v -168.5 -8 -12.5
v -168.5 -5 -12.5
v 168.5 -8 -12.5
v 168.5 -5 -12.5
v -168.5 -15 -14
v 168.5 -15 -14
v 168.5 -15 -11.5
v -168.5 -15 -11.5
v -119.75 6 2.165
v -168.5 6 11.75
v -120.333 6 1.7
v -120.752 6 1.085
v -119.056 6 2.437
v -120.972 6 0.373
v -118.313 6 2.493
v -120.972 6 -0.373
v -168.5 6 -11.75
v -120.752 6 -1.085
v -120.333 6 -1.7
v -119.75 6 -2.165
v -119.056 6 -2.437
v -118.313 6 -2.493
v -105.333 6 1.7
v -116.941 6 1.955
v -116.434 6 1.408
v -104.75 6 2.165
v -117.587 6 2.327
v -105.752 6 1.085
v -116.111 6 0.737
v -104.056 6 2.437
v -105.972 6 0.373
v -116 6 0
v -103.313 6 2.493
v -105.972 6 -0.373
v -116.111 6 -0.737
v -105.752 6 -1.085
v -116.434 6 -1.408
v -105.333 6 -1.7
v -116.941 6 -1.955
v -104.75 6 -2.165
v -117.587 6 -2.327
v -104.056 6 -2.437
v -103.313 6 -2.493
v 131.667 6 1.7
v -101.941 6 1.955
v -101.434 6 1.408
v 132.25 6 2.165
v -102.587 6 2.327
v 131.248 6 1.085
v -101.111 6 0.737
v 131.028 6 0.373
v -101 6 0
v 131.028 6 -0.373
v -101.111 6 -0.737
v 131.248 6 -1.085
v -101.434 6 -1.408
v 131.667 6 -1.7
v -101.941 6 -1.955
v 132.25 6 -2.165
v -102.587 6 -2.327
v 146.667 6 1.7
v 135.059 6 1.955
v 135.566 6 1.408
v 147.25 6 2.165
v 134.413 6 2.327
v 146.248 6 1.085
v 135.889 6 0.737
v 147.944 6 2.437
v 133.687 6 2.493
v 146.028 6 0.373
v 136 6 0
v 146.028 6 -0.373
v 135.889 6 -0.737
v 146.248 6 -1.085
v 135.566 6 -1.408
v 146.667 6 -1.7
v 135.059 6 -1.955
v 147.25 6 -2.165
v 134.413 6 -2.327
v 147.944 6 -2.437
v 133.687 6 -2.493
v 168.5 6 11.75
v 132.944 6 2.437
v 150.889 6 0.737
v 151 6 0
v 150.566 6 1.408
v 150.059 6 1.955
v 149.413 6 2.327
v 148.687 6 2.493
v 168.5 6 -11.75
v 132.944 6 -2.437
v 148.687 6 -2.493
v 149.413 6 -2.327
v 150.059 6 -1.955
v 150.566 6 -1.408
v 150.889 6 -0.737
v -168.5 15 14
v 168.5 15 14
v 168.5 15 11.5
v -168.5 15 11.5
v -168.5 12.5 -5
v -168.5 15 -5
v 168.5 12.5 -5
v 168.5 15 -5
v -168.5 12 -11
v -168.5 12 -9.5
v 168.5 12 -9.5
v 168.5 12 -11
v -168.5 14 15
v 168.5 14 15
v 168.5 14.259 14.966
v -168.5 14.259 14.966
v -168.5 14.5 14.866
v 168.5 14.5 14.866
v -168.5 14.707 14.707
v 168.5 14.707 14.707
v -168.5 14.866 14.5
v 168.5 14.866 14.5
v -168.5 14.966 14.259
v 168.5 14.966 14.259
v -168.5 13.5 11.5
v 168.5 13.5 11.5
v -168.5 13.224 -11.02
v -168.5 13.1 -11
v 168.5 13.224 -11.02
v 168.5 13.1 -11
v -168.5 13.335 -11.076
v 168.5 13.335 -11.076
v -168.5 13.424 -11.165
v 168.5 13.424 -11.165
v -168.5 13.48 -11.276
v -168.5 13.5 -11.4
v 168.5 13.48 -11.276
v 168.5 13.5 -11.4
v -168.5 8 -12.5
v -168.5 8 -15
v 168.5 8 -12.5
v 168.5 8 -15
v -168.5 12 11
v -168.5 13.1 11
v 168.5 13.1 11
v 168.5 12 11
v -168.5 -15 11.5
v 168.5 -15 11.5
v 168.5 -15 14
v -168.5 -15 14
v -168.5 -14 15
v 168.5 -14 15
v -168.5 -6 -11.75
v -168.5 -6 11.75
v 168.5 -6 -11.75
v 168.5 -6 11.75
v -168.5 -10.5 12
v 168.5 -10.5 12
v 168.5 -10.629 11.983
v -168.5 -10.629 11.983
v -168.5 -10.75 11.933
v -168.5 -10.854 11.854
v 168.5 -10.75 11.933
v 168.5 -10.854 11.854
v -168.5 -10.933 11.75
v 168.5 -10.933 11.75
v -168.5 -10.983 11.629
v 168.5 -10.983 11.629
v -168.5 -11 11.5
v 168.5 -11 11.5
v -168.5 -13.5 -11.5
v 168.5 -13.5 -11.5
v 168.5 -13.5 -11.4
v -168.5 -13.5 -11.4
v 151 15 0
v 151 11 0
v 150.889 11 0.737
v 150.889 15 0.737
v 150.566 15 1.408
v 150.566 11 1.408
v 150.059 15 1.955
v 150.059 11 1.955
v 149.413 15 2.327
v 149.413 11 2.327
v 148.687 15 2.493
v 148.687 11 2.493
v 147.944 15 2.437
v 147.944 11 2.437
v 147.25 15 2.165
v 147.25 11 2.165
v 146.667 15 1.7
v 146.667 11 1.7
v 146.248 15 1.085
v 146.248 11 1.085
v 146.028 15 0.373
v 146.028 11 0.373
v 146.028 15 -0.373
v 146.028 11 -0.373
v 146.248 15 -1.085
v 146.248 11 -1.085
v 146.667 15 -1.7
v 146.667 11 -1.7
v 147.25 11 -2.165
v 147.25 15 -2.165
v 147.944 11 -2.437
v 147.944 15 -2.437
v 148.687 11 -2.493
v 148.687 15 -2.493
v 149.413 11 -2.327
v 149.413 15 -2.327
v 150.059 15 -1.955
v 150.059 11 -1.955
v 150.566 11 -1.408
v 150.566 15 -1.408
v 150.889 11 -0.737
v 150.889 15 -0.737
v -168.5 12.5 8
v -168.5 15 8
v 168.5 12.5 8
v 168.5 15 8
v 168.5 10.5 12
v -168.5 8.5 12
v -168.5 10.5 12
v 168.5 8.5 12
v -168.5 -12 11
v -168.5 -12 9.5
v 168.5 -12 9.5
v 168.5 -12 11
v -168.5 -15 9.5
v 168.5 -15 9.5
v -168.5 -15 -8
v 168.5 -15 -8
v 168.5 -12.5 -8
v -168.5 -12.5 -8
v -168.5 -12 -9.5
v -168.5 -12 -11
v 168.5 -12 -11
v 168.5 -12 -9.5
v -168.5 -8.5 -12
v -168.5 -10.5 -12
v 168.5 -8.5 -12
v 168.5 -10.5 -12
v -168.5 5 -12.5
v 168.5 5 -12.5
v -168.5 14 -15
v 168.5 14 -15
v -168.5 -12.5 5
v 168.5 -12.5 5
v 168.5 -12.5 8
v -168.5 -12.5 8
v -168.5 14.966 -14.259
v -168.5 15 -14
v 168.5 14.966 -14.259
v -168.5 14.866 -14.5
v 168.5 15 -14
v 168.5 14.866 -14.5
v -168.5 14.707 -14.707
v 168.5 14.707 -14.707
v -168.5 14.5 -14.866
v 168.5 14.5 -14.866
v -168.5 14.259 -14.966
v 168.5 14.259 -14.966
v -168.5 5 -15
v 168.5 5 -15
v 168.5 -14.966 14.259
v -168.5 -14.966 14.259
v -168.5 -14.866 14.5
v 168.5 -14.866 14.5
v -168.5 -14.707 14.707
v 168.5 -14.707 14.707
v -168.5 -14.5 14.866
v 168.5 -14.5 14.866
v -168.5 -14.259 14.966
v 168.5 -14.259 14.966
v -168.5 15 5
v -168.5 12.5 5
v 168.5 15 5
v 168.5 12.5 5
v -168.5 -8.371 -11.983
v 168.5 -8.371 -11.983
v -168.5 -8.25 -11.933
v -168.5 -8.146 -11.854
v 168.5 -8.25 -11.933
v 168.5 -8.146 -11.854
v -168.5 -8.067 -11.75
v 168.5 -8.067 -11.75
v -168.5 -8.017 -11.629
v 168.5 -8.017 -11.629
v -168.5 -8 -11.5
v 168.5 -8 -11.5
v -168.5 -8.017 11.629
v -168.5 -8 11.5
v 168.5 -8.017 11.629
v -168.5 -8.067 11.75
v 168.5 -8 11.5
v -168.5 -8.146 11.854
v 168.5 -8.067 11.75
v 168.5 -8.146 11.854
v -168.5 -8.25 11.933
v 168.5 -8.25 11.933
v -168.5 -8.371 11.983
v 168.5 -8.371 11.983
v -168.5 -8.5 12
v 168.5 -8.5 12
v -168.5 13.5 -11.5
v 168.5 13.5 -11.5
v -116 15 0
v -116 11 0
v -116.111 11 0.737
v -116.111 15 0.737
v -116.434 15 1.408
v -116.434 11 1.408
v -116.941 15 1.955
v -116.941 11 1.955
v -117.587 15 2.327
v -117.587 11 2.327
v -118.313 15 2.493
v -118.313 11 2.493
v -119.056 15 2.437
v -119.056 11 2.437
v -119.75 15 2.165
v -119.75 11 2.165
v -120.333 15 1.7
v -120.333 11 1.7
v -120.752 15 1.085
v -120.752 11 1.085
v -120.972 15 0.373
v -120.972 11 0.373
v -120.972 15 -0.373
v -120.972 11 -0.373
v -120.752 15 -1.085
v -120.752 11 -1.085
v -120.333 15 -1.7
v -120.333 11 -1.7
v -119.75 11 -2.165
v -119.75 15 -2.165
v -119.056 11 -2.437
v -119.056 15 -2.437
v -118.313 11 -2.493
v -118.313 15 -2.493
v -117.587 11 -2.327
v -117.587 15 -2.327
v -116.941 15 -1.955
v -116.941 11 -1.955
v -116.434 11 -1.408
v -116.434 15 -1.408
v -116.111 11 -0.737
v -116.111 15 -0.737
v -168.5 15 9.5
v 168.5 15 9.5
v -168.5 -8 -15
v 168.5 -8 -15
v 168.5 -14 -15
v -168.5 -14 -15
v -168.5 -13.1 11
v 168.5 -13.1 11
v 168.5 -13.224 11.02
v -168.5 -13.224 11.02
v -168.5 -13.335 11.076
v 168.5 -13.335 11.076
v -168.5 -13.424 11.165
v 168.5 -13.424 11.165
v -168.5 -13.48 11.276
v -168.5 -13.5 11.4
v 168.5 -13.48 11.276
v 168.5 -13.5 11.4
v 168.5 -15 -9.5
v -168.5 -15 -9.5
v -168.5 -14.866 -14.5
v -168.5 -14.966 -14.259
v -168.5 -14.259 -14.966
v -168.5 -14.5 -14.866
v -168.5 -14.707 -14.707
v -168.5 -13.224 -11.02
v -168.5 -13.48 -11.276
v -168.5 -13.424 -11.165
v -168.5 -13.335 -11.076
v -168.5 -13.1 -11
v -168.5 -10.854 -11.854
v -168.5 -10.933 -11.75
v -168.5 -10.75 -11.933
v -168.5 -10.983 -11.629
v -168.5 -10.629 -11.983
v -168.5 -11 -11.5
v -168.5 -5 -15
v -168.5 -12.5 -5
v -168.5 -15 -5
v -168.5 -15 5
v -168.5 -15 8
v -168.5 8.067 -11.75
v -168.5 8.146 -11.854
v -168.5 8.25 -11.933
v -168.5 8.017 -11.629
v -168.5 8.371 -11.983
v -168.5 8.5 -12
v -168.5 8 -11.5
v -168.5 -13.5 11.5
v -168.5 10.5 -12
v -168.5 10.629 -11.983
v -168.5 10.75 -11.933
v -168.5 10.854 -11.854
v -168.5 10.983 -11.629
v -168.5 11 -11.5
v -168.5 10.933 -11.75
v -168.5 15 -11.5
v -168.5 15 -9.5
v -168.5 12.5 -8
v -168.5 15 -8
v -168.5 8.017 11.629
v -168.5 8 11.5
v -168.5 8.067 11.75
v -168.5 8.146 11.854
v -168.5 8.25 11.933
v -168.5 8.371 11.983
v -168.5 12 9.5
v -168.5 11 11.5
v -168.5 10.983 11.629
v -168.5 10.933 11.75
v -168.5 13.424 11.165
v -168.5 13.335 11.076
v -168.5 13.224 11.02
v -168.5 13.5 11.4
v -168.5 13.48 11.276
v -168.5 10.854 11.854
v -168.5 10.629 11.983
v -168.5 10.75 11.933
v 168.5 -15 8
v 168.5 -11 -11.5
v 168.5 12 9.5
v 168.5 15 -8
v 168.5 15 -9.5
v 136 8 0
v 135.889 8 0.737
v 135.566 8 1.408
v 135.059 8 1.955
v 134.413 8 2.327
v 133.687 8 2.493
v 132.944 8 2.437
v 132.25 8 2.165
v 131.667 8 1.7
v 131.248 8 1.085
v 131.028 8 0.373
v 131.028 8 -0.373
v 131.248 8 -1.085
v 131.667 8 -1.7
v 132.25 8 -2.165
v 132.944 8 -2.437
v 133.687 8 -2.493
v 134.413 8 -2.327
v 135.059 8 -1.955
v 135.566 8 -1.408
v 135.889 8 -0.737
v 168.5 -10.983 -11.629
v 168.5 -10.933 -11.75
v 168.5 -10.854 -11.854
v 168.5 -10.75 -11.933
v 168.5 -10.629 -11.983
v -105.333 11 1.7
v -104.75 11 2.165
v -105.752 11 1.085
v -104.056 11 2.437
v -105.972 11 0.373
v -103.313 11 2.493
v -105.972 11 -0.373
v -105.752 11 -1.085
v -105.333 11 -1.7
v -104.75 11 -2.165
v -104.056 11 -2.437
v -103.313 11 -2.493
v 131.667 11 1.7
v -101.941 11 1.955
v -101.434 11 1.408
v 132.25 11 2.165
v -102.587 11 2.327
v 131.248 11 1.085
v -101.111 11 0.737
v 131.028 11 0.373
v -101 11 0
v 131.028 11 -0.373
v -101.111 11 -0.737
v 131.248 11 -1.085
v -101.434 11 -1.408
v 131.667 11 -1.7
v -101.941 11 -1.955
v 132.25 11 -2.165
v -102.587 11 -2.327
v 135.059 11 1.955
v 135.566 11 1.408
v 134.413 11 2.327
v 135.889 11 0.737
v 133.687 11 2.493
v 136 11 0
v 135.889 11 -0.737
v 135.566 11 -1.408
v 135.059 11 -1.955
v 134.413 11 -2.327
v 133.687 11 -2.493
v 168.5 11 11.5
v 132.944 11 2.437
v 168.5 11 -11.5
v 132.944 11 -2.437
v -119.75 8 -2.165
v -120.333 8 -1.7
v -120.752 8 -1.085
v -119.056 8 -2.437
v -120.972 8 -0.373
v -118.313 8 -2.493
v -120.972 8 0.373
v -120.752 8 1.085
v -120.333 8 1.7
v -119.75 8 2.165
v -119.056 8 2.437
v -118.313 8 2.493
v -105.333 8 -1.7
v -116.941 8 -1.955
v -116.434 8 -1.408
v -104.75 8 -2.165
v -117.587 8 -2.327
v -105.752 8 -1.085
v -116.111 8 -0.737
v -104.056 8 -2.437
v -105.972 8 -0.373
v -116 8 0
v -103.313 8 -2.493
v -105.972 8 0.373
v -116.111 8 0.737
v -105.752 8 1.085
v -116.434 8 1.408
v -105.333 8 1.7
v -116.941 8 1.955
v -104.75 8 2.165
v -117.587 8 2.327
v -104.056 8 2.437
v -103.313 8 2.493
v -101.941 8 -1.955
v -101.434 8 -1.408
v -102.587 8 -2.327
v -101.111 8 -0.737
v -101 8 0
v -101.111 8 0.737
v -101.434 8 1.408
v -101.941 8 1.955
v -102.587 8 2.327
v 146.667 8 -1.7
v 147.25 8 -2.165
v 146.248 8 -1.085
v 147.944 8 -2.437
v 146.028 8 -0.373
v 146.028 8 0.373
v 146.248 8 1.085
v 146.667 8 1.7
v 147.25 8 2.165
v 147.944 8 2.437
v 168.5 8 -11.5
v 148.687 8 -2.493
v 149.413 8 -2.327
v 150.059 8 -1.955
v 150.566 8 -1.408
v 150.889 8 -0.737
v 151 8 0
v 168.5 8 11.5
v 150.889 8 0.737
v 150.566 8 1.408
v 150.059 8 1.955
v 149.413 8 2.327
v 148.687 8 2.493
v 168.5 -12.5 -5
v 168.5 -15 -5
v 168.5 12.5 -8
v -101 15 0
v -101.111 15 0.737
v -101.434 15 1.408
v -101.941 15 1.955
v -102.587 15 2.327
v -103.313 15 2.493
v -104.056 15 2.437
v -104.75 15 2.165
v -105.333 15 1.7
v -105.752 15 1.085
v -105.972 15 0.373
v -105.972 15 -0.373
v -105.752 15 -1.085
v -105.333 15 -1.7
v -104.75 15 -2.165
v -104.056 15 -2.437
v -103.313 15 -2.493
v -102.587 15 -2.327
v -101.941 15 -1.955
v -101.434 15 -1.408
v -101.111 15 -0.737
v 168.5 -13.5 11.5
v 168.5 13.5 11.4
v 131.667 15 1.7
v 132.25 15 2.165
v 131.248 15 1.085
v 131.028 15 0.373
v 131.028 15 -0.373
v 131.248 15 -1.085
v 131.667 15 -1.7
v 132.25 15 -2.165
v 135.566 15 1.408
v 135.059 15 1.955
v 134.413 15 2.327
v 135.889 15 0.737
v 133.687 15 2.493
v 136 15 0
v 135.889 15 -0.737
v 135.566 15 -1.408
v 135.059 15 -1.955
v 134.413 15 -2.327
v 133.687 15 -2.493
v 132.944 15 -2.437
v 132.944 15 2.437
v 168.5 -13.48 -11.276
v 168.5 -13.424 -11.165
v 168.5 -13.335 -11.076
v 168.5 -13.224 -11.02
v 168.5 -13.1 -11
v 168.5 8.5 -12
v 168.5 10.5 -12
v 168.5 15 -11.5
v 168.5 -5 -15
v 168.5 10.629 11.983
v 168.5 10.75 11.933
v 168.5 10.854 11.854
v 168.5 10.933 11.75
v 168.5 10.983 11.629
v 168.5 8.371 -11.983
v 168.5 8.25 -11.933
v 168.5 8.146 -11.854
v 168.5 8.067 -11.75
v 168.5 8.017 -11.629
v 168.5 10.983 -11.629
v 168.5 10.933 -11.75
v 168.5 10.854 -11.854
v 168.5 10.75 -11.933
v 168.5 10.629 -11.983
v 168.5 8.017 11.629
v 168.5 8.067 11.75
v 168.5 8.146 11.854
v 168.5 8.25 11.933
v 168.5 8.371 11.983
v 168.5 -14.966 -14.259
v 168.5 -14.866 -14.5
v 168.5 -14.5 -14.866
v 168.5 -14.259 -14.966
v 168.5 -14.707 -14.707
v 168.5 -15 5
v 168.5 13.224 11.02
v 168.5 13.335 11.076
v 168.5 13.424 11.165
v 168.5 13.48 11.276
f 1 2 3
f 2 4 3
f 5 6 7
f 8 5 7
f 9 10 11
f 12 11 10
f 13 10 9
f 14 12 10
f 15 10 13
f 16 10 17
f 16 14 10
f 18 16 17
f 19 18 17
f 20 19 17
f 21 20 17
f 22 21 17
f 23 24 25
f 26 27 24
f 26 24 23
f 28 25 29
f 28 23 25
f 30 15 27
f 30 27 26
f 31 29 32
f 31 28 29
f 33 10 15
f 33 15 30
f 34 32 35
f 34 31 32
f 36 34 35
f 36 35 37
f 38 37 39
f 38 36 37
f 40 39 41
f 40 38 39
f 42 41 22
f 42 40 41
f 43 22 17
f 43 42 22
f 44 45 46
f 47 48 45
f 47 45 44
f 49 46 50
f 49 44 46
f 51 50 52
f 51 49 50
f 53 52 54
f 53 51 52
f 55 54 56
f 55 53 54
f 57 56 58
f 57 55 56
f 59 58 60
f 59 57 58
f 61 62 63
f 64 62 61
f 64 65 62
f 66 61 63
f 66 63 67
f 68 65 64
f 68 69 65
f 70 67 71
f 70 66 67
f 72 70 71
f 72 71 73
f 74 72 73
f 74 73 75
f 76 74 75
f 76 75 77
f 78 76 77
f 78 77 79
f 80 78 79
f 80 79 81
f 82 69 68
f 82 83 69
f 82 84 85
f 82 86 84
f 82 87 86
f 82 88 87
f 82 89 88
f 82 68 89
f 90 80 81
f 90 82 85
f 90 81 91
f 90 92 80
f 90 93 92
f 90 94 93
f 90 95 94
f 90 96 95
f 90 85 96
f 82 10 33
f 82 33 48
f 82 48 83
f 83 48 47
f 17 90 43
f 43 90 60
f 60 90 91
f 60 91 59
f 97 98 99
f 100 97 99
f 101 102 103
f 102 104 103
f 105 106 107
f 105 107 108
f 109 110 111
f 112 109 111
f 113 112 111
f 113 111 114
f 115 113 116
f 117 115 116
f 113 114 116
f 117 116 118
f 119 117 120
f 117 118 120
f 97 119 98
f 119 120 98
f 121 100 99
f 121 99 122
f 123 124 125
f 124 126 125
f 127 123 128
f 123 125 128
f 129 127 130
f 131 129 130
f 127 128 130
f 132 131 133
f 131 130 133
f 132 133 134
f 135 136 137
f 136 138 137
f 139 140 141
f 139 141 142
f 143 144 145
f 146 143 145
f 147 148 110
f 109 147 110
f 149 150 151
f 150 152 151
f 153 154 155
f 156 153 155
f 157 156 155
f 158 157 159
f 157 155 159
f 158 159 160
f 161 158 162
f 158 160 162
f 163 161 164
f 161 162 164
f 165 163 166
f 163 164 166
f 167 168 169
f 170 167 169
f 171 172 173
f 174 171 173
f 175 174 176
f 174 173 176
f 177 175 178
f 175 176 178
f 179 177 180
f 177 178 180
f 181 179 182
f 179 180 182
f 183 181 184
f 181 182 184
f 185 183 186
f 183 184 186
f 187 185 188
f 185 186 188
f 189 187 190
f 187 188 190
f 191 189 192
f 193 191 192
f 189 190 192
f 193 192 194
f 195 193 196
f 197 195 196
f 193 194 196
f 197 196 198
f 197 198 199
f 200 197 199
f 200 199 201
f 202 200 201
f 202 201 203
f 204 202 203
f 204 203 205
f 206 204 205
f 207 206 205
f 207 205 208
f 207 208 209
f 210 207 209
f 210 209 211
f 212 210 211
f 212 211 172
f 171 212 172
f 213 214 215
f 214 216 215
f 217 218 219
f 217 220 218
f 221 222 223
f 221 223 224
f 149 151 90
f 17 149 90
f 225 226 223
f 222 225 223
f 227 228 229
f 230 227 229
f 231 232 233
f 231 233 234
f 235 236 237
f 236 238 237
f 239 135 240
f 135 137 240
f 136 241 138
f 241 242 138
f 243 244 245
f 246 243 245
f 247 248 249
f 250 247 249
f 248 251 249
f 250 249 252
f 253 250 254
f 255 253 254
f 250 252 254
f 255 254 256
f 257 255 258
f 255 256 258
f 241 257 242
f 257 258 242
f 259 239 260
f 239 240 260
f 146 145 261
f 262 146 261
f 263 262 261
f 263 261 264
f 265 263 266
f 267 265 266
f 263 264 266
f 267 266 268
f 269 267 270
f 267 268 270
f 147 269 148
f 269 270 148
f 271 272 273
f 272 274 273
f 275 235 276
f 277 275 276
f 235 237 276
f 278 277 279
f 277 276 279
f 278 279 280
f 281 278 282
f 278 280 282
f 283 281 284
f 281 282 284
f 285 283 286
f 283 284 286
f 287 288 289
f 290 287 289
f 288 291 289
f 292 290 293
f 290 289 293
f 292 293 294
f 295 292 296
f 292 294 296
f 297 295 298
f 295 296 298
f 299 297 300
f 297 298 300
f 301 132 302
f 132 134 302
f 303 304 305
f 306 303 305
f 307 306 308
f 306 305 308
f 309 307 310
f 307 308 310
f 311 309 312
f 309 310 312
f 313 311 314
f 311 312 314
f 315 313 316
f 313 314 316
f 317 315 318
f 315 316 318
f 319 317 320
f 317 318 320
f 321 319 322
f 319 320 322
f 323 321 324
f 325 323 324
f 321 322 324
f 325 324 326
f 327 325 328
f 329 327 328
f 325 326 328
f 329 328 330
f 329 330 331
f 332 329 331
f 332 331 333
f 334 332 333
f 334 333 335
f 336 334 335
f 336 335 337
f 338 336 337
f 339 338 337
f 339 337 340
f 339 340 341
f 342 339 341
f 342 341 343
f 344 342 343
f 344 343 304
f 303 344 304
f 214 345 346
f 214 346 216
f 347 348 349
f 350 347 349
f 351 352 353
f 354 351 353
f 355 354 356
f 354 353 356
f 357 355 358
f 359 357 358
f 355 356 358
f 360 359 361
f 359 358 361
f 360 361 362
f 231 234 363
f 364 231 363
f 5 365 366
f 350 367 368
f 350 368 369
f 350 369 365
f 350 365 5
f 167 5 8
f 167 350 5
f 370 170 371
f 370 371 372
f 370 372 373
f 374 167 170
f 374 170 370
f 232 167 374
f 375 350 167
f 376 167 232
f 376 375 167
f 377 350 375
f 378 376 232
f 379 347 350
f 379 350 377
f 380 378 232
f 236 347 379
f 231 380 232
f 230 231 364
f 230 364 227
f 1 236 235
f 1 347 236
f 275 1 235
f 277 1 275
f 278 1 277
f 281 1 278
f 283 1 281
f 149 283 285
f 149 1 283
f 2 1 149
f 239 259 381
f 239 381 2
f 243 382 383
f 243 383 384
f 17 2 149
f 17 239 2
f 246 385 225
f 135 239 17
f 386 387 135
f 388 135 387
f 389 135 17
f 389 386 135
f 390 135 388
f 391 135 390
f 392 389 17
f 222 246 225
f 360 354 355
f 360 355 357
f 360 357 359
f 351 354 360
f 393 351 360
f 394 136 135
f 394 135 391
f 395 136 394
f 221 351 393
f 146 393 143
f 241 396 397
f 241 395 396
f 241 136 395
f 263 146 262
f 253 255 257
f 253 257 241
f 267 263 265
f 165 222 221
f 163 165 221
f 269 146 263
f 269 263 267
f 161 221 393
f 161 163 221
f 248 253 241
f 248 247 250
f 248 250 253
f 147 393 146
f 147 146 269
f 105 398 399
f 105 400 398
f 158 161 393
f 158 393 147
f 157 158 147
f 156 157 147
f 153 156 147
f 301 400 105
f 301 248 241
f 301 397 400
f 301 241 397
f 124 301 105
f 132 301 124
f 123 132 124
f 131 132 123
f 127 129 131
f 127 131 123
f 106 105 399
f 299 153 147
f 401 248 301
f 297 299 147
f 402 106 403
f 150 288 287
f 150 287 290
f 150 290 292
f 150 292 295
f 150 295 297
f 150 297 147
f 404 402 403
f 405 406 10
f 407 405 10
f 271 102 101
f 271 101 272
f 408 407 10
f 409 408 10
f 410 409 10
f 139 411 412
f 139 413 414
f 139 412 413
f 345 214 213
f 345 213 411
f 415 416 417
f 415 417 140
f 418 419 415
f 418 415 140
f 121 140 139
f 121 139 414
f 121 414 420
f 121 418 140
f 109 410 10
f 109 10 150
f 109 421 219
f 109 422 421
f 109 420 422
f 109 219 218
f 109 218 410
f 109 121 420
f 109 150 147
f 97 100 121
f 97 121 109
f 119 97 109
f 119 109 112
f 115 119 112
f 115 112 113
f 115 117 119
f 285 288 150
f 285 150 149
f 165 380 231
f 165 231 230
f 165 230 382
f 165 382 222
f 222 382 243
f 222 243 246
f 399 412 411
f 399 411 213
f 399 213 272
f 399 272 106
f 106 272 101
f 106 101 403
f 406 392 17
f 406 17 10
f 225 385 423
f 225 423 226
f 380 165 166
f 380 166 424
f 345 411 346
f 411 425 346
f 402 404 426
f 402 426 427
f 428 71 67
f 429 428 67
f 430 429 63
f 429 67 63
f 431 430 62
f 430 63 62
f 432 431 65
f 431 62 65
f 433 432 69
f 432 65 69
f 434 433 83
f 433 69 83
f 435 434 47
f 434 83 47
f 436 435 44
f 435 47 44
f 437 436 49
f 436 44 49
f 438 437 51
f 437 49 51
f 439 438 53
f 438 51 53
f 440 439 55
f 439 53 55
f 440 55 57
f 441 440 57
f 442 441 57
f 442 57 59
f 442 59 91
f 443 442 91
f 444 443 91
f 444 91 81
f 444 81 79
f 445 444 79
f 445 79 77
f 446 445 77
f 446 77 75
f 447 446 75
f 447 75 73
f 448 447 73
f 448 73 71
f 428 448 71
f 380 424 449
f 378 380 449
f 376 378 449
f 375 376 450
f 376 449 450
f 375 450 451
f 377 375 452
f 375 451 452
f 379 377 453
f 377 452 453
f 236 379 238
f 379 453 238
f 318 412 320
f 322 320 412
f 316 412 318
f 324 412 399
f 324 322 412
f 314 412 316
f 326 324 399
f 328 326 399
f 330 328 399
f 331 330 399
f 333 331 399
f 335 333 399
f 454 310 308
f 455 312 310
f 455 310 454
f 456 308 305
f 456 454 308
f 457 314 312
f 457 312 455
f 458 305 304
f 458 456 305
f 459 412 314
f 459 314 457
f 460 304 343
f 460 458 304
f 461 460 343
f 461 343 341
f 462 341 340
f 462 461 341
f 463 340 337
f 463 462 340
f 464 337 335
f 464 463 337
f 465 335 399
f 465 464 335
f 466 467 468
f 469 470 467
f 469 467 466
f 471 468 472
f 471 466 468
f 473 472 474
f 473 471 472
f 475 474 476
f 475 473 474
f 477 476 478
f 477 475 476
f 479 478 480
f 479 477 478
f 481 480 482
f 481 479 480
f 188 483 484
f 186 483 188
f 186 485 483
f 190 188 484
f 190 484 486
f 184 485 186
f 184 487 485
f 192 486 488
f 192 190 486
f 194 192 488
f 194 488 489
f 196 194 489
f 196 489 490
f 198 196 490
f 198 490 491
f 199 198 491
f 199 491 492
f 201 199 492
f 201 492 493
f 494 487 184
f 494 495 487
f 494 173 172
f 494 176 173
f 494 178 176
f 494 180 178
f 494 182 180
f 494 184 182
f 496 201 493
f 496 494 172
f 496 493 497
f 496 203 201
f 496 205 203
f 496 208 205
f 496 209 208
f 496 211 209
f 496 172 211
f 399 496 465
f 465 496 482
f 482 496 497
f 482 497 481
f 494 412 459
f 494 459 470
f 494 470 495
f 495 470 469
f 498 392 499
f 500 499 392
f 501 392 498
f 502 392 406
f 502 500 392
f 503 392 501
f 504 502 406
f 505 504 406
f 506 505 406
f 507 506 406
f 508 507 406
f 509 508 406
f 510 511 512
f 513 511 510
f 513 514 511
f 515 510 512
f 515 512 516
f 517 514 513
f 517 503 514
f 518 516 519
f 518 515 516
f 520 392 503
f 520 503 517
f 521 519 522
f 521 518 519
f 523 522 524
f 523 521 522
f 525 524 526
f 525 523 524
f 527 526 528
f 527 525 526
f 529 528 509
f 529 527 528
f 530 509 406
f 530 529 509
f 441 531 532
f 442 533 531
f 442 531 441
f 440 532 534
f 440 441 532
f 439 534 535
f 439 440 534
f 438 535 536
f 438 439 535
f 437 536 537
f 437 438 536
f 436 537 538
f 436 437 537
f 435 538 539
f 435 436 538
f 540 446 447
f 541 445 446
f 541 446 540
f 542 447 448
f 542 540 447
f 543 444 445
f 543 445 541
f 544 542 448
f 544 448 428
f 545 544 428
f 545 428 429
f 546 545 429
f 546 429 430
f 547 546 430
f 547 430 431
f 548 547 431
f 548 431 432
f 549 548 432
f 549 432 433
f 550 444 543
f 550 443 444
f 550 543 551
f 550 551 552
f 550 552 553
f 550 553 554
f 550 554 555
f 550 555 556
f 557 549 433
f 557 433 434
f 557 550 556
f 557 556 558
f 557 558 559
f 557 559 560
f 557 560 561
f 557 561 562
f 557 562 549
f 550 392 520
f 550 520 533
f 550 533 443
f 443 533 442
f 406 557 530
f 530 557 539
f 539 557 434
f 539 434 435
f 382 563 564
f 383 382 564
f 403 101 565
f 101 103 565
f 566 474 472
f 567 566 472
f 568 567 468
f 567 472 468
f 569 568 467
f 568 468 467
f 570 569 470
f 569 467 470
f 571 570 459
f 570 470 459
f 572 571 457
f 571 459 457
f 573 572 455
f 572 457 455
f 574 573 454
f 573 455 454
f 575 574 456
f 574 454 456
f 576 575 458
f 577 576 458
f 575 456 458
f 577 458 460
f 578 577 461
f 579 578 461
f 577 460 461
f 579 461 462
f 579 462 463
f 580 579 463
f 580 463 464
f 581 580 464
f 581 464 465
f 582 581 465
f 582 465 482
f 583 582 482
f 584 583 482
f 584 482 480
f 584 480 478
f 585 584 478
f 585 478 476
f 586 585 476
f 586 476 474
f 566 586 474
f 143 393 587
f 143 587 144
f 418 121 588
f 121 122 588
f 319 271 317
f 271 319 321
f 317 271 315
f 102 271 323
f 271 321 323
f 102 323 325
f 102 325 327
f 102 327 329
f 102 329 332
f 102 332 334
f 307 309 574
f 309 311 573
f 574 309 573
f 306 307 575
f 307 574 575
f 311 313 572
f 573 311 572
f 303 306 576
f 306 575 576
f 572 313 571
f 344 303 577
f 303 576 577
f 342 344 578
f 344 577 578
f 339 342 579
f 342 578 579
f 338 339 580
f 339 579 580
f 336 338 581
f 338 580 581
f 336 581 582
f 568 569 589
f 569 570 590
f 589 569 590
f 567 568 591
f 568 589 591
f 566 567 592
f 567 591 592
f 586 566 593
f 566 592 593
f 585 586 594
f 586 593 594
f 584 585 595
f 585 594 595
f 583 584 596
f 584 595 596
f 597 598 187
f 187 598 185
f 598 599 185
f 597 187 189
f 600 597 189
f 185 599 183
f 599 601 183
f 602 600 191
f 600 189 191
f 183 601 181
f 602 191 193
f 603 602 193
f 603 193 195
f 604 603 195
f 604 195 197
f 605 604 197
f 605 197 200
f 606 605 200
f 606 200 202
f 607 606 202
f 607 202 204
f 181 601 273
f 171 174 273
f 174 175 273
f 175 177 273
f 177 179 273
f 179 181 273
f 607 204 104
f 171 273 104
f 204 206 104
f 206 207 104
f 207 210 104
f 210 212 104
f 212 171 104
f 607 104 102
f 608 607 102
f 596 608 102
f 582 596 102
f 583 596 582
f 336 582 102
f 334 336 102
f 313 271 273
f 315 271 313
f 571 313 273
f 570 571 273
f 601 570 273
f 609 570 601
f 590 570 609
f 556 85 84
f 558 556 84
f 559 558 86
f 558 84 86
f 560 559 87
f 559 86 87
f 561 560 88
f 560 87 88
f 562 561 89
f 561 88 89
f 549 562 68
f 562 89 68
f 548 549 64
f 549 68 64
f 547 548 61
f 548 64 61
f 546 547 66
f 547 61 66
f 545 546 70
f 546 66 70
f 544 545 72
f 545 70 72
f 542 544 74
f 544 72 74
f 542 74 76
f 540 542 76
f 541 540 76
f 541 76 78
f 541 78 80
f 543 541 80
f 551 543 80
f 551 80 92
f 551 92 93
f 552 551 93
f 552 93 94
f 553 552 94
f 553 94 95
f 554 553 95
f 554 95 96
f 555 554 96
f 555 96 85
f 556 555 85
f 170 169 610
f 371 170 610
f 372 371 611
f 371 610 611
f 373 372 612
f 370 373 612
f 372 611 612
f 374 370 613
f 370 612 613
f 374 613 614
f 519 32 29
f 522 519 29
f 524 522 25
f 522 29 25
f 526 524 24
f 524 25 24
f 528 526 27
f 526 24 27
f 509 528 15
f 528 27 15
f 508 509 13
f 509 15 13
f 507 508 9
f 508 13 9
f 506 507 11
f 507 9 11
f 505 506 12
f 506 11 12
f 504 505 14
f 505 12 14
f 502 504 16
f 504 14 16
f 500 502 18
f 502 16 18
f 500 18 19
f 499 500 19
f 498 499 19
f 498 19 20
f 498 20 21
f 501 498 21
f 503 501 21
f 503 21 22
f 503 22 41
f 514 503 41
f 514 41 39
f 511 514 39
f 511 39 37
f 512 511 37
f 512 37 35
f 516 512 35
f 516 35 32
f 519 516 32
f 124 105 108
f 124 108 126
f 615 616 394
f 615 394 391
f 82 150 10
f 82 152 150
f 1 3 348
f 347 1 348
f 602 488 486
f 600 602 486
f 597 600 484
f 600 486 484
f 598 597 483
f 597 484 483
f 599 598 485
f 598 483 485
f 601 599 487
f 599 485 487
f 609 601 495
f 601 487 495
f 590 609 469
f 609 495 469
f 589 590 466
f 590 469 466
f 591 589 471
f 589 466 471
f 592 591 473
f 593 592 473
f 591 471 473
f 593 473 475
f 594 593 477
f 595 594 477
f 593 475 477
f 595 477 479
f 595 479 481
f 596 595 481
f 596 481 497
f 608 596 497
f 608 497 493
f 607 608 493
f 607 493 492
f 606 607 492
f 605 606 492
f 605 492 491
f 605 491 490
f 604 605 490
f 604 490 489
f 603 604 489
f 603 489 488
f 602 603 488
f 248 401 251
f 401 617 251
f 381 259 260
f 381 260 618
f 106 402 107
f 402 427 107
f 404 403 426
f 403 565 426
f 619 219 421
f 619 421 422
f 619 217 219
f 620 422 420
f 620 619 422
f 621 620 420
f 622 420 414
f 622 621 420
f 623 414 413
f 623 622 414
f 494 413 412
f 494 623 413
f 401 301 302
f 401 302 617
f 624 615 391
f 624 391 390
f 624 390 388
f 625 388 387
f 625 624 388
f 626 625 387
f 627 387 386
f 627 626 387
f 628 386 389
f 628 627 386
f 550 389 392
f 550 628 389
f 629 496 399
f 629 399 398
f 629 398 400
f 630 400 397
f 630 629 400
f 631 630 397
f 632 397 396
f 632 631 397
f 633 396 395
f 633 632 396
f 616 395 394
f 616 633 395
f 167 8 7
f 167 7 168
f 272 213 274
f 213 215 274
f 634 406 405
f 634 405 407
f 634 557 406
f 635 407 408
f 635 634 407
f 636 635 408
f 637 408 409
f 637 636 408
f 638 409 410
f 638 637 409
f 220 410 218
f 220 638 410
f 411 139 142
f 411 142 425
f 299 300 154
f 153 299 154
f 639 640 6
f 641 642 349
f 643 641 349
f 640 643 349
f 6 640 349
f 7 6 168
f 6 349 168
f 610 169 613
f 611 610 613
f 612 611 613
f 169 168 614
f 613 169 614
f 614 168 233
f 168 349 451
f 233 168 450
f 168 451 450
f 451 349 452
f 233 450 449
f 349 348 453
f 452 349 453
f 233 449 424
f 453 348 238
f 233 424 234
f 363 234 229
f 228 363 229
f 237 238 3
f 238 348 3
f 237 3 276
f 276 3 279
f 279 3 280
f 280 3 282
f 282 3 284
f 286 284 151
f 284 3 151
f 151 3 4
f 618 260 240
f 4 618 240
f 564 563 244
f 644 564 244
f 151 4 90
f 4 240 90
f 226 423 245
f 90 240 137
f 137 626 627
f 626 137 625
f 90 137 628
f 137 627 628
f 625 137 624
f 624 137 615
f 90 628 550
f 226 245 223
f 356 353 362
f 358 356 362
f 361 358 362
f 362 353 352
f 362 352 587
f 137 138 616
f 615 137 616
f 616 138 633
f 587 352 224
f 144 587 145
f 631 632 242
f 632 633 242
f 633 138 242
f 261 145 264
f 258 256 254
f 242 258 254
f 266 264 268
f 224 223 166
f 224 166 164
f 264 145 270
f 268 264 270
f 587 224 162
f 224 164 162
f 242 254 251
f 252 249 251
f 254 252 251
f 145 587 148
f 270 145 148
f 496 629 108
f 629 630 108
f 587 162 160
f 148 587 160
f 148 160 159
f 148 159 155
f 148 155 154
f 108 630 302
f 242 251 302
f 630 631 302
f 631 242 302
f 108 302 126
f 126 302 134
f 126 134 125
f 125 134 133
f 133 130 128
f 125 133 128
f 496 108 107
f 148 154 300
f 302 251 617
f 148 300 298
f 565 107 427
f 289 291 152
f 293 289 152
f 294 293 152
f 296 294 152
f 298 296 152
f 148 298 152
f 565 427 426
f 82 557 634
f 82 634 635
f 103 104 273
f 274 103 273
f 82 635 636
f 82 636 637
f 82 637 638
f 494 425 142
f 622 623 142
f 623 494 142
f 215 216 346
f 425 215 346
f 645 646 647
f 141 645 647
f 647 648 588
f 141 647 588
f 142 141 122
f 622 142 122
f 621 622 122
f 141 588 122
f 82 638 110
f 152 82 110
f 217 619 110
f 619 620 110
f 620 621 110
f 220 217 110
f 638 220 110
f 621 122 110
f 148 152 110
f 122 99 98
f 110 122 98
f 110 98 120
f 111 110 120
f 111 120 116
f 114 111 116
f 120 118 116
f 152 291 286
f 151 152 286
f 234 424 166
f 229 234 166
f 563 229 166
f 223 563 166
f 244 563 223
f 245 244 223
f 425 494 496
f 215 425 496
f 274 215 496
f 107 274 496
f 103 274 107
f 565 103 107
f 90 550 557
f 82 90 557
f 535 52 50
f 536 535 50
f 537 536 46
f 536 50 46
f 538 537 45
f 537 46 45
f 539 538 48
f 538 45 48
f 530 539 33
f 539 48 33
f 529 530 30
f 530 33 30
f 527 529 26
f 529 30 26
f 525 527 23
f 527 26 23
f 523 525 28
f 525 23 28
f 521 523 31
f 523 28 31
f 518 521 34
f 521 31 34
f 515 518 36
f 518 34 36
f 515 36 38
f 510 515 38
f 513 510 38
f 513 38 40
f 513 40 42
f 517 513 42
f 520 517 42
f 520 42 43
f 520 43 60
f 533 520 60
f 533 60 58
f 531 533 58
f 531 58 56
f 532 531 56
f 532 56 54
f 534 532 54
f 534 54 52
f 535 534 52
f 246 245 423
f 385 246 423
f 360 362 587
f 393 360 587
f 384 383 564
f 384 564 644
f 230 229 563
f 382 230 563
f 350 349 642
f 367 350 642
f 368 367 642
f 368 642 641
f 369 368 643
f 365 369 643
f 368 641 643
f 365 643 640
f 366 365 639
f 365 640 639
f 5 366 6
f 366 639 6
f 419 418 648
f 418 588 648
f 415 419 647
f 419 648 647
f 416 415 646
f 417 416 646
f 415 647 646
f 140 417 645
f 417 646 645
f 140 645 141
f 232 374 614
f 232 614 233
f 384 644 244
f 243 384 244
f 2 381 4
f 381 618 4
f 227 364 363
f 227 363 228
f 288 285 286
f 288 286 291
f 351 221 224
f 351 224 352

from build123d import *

# Parameters (mm, degrees)
SKETCH_1_W             = 23.5
SKETCH_1_H             = 12
EXTRUDE_1_DEPTH        = 168.5
HOLE_WIZARD_M6_1_D     = 5
HOLE_WIZARD_M6_1_DEPTH = 15
HOLE_WIZARD_M6_1_TIP   = 1.502151548


with BuildPart() as part:
    # 草图1 → 凸台-拉伸1 (new, symmetric)
    with BuildSketch(Plane(origin=(0, 0, 0), x_dir=(0, 0, -1), z_dir=(1, 0, 0))):
        with BuildLine():
            Line((-14, 15), (-11.5, 15))
            Line((-11.5, 15), (-11.5, 13.5))
            Line((-11.5, 13.5), (-11.4, 13.5))
            ThreePointArc((-11.4, 13.5), (-11.117157288, 13.382842712), (-11, 13.1))
            Line((-11, 13.1), (-11, 12))
            Line((-11, 12), (-9.5, 12))
            Line((-9.5, 12), (-9.5, 15))
            Line((-9.5, 15), (-8, 15))
            Line((-8, 15), (-8, 12.5))
            Line((-8, 12.5), (-5, 12.5))
            Line((-5, 12.5), (-5, 15))
            Line((-5, 15), (5, 15))
            Line((5, 15), (5, 12.5))
            Line((5, 12.5), (8, 12.5))
            Line((8, 12.5), (8, 15))
            Line((8, 15), (9.5, 15))
            Line((9.5, 15), (9.5, 12))
            Line((9.5, 12), (11, 12))
            Line((11, 12), (11, 13.1))
            ThreePointArc((11, 13.1), (11.117157288, 13.382842712), (11.4, 13.5))
            Line((11.4, 13.5), (11.5, 13.5))
            Line((11.5, 13.5), (11.5, 15))
            Line((11.5, 15), (14, 15))
            ThreePointArc((14, 15), (14.707106781, 14.707106781), (15, 14))
            Line((15, 14), (15, 8))
            Line((15, 8), (12.5, 8))
            Line((12.5, 8), (12.5, 5))
            Line((12.5, 5), (15, 5))
            Line((15, 5), (15, -5))
            Line((15, -5), (12.5, -5))
            Line((12.5, -5), (12.5, -8))
            Line((12.5, -8), (15, -8))
            Line((15, -8), (15, -14))
            ThreePointArc((15, -14), (14.707106781, -14.707106781), (14, -15))
            Line((14, -15), (11.5, -15))
            Line((11.5, -15), (11.5, -13.5))
            Line((11.5, -13.5), (11.4, -13.5))
            ThreePointArc((11.4, -13.5), (11.117157288, -13.382842712), (11, -13.1))
            Line((11, -13.1), (11, -12))
            Line((11, -12), (9.5, -12))
            Line((9.5, -12), (9.5, -15))
            Line((9.5, -15), (8, -15))
            Line((8, -15), (8, -12.5))
            Line((8, -12.5), (5, -12.5))
            Line((5, -12.5), (5, -15))
            Line((5, -15), (-5, -15))
            Line((-5, -15), (-5, -12.5))
            Line((-5, -12.5), (-8, -12.5))
            Line((-8, -12.5), (-8, -15))
            Line((-8, -15), (-9.5, -15))
            Line((-9.5, -15), (-9.5, -12))
            Line((-9.5, -12), (-11, -12))
            Line((-11, -12), (-11, -13.1))
            ThreePointArc((-11, -13.1), (-11.117157288, -13.382842712), (-11.4, -13.5))
            Line((-11.4, -13.5), (-11.5, -13.5))
            Line((-11.5, -13.5), (-11.5, -15))
            Line((-11.5, -15), (-14, -15))
            ThreePointArc((-14, -15), (-14.707106781, -14.707106781), (-15, -14))
            Line((-15, -14), (-15, 14))
            ThreePointArc((-15, 14), (-14.707106781, 14.707106781), (-14, 15))
        make_face()
        with BuildLine():
            Line((12, -10.5), (12, -8.5))
            ThreePointArc((12, -8.5), (11.853553391, -8.146446609), (11.5, -8))
            Line((11.5, -8), (-11.5, -8))
            ThreePointArc((-11.5, -8), (-11.853553391, -8.146446609), (-12, -8.5))
            Line((-12, -8.5), (-12, -10.5))
            ThreePointArc((-12, -10.5), (-11.853553391, -10.853553391), (-11.5, -11))
            Line((-11.5, -11), (11.5, -11))
            ThreePointArc((11.5, -11), (11.853553391, -10.853553391), (12, -10.5))
        make_face(mode=Mode.SUBTRACT)
        with BuildLine():
            Line((-11.5, 11), (11.5, 11))
            ThreePointArc((11.5, 11), (11.853553391, 10.853553391), (12, 10.5))
            Line((12, 10.5), (12, 8.5))
            ThreePointArc((12, 8.5), (11.853553391, 8.146446609), (11.5, 8))
            Line((11.5, 8), (-11.5, 8))
            ThreePointArc((-11.5, 8), (-11.853553391, 8.146446609), (-12, 8.5))
            Line((-12, 8.5), (-12, 10.5))
            ThreePointArc((-12, 10.5), (-11.853553391, 10.853553391), (-11.5, 11))
        make_face(mode=Mode.SUBTRACT)
        Rectangle(SKETCH_1_W, SKETCH_1_H, mode=Mode.SUBTRACT)
    extrude(amount=EXTRUDE_1_DEPTH, both=True)

    # M6 螺纹孔1
    with Locations(Plane(origin=(0, 15, 0), x_dir=(-1, 0, 0), z_dir=(0, 1, 0))):
        with Locations((-148.5, 0), (-133.5, 0), (103.5, 0), (118.5, 0)):
            Hole(HOLE_WIZARD_M6_1_D / 2, depth=HOLE_WIZARD_M6_1_DEPTH)
            with Locations((0, 0, -(HOLE_WIZARD_M6_1_DEPTH + HOLE_WIZARD_M6_1_TIP / 2))):  # 118° drill point
                Cone(0, HOLE_WIZARD_M6_1_D / 2, HOLE_WIZARD_M6_1_TIP, mode=Mode.SUBTRACT)


solid = part.part
